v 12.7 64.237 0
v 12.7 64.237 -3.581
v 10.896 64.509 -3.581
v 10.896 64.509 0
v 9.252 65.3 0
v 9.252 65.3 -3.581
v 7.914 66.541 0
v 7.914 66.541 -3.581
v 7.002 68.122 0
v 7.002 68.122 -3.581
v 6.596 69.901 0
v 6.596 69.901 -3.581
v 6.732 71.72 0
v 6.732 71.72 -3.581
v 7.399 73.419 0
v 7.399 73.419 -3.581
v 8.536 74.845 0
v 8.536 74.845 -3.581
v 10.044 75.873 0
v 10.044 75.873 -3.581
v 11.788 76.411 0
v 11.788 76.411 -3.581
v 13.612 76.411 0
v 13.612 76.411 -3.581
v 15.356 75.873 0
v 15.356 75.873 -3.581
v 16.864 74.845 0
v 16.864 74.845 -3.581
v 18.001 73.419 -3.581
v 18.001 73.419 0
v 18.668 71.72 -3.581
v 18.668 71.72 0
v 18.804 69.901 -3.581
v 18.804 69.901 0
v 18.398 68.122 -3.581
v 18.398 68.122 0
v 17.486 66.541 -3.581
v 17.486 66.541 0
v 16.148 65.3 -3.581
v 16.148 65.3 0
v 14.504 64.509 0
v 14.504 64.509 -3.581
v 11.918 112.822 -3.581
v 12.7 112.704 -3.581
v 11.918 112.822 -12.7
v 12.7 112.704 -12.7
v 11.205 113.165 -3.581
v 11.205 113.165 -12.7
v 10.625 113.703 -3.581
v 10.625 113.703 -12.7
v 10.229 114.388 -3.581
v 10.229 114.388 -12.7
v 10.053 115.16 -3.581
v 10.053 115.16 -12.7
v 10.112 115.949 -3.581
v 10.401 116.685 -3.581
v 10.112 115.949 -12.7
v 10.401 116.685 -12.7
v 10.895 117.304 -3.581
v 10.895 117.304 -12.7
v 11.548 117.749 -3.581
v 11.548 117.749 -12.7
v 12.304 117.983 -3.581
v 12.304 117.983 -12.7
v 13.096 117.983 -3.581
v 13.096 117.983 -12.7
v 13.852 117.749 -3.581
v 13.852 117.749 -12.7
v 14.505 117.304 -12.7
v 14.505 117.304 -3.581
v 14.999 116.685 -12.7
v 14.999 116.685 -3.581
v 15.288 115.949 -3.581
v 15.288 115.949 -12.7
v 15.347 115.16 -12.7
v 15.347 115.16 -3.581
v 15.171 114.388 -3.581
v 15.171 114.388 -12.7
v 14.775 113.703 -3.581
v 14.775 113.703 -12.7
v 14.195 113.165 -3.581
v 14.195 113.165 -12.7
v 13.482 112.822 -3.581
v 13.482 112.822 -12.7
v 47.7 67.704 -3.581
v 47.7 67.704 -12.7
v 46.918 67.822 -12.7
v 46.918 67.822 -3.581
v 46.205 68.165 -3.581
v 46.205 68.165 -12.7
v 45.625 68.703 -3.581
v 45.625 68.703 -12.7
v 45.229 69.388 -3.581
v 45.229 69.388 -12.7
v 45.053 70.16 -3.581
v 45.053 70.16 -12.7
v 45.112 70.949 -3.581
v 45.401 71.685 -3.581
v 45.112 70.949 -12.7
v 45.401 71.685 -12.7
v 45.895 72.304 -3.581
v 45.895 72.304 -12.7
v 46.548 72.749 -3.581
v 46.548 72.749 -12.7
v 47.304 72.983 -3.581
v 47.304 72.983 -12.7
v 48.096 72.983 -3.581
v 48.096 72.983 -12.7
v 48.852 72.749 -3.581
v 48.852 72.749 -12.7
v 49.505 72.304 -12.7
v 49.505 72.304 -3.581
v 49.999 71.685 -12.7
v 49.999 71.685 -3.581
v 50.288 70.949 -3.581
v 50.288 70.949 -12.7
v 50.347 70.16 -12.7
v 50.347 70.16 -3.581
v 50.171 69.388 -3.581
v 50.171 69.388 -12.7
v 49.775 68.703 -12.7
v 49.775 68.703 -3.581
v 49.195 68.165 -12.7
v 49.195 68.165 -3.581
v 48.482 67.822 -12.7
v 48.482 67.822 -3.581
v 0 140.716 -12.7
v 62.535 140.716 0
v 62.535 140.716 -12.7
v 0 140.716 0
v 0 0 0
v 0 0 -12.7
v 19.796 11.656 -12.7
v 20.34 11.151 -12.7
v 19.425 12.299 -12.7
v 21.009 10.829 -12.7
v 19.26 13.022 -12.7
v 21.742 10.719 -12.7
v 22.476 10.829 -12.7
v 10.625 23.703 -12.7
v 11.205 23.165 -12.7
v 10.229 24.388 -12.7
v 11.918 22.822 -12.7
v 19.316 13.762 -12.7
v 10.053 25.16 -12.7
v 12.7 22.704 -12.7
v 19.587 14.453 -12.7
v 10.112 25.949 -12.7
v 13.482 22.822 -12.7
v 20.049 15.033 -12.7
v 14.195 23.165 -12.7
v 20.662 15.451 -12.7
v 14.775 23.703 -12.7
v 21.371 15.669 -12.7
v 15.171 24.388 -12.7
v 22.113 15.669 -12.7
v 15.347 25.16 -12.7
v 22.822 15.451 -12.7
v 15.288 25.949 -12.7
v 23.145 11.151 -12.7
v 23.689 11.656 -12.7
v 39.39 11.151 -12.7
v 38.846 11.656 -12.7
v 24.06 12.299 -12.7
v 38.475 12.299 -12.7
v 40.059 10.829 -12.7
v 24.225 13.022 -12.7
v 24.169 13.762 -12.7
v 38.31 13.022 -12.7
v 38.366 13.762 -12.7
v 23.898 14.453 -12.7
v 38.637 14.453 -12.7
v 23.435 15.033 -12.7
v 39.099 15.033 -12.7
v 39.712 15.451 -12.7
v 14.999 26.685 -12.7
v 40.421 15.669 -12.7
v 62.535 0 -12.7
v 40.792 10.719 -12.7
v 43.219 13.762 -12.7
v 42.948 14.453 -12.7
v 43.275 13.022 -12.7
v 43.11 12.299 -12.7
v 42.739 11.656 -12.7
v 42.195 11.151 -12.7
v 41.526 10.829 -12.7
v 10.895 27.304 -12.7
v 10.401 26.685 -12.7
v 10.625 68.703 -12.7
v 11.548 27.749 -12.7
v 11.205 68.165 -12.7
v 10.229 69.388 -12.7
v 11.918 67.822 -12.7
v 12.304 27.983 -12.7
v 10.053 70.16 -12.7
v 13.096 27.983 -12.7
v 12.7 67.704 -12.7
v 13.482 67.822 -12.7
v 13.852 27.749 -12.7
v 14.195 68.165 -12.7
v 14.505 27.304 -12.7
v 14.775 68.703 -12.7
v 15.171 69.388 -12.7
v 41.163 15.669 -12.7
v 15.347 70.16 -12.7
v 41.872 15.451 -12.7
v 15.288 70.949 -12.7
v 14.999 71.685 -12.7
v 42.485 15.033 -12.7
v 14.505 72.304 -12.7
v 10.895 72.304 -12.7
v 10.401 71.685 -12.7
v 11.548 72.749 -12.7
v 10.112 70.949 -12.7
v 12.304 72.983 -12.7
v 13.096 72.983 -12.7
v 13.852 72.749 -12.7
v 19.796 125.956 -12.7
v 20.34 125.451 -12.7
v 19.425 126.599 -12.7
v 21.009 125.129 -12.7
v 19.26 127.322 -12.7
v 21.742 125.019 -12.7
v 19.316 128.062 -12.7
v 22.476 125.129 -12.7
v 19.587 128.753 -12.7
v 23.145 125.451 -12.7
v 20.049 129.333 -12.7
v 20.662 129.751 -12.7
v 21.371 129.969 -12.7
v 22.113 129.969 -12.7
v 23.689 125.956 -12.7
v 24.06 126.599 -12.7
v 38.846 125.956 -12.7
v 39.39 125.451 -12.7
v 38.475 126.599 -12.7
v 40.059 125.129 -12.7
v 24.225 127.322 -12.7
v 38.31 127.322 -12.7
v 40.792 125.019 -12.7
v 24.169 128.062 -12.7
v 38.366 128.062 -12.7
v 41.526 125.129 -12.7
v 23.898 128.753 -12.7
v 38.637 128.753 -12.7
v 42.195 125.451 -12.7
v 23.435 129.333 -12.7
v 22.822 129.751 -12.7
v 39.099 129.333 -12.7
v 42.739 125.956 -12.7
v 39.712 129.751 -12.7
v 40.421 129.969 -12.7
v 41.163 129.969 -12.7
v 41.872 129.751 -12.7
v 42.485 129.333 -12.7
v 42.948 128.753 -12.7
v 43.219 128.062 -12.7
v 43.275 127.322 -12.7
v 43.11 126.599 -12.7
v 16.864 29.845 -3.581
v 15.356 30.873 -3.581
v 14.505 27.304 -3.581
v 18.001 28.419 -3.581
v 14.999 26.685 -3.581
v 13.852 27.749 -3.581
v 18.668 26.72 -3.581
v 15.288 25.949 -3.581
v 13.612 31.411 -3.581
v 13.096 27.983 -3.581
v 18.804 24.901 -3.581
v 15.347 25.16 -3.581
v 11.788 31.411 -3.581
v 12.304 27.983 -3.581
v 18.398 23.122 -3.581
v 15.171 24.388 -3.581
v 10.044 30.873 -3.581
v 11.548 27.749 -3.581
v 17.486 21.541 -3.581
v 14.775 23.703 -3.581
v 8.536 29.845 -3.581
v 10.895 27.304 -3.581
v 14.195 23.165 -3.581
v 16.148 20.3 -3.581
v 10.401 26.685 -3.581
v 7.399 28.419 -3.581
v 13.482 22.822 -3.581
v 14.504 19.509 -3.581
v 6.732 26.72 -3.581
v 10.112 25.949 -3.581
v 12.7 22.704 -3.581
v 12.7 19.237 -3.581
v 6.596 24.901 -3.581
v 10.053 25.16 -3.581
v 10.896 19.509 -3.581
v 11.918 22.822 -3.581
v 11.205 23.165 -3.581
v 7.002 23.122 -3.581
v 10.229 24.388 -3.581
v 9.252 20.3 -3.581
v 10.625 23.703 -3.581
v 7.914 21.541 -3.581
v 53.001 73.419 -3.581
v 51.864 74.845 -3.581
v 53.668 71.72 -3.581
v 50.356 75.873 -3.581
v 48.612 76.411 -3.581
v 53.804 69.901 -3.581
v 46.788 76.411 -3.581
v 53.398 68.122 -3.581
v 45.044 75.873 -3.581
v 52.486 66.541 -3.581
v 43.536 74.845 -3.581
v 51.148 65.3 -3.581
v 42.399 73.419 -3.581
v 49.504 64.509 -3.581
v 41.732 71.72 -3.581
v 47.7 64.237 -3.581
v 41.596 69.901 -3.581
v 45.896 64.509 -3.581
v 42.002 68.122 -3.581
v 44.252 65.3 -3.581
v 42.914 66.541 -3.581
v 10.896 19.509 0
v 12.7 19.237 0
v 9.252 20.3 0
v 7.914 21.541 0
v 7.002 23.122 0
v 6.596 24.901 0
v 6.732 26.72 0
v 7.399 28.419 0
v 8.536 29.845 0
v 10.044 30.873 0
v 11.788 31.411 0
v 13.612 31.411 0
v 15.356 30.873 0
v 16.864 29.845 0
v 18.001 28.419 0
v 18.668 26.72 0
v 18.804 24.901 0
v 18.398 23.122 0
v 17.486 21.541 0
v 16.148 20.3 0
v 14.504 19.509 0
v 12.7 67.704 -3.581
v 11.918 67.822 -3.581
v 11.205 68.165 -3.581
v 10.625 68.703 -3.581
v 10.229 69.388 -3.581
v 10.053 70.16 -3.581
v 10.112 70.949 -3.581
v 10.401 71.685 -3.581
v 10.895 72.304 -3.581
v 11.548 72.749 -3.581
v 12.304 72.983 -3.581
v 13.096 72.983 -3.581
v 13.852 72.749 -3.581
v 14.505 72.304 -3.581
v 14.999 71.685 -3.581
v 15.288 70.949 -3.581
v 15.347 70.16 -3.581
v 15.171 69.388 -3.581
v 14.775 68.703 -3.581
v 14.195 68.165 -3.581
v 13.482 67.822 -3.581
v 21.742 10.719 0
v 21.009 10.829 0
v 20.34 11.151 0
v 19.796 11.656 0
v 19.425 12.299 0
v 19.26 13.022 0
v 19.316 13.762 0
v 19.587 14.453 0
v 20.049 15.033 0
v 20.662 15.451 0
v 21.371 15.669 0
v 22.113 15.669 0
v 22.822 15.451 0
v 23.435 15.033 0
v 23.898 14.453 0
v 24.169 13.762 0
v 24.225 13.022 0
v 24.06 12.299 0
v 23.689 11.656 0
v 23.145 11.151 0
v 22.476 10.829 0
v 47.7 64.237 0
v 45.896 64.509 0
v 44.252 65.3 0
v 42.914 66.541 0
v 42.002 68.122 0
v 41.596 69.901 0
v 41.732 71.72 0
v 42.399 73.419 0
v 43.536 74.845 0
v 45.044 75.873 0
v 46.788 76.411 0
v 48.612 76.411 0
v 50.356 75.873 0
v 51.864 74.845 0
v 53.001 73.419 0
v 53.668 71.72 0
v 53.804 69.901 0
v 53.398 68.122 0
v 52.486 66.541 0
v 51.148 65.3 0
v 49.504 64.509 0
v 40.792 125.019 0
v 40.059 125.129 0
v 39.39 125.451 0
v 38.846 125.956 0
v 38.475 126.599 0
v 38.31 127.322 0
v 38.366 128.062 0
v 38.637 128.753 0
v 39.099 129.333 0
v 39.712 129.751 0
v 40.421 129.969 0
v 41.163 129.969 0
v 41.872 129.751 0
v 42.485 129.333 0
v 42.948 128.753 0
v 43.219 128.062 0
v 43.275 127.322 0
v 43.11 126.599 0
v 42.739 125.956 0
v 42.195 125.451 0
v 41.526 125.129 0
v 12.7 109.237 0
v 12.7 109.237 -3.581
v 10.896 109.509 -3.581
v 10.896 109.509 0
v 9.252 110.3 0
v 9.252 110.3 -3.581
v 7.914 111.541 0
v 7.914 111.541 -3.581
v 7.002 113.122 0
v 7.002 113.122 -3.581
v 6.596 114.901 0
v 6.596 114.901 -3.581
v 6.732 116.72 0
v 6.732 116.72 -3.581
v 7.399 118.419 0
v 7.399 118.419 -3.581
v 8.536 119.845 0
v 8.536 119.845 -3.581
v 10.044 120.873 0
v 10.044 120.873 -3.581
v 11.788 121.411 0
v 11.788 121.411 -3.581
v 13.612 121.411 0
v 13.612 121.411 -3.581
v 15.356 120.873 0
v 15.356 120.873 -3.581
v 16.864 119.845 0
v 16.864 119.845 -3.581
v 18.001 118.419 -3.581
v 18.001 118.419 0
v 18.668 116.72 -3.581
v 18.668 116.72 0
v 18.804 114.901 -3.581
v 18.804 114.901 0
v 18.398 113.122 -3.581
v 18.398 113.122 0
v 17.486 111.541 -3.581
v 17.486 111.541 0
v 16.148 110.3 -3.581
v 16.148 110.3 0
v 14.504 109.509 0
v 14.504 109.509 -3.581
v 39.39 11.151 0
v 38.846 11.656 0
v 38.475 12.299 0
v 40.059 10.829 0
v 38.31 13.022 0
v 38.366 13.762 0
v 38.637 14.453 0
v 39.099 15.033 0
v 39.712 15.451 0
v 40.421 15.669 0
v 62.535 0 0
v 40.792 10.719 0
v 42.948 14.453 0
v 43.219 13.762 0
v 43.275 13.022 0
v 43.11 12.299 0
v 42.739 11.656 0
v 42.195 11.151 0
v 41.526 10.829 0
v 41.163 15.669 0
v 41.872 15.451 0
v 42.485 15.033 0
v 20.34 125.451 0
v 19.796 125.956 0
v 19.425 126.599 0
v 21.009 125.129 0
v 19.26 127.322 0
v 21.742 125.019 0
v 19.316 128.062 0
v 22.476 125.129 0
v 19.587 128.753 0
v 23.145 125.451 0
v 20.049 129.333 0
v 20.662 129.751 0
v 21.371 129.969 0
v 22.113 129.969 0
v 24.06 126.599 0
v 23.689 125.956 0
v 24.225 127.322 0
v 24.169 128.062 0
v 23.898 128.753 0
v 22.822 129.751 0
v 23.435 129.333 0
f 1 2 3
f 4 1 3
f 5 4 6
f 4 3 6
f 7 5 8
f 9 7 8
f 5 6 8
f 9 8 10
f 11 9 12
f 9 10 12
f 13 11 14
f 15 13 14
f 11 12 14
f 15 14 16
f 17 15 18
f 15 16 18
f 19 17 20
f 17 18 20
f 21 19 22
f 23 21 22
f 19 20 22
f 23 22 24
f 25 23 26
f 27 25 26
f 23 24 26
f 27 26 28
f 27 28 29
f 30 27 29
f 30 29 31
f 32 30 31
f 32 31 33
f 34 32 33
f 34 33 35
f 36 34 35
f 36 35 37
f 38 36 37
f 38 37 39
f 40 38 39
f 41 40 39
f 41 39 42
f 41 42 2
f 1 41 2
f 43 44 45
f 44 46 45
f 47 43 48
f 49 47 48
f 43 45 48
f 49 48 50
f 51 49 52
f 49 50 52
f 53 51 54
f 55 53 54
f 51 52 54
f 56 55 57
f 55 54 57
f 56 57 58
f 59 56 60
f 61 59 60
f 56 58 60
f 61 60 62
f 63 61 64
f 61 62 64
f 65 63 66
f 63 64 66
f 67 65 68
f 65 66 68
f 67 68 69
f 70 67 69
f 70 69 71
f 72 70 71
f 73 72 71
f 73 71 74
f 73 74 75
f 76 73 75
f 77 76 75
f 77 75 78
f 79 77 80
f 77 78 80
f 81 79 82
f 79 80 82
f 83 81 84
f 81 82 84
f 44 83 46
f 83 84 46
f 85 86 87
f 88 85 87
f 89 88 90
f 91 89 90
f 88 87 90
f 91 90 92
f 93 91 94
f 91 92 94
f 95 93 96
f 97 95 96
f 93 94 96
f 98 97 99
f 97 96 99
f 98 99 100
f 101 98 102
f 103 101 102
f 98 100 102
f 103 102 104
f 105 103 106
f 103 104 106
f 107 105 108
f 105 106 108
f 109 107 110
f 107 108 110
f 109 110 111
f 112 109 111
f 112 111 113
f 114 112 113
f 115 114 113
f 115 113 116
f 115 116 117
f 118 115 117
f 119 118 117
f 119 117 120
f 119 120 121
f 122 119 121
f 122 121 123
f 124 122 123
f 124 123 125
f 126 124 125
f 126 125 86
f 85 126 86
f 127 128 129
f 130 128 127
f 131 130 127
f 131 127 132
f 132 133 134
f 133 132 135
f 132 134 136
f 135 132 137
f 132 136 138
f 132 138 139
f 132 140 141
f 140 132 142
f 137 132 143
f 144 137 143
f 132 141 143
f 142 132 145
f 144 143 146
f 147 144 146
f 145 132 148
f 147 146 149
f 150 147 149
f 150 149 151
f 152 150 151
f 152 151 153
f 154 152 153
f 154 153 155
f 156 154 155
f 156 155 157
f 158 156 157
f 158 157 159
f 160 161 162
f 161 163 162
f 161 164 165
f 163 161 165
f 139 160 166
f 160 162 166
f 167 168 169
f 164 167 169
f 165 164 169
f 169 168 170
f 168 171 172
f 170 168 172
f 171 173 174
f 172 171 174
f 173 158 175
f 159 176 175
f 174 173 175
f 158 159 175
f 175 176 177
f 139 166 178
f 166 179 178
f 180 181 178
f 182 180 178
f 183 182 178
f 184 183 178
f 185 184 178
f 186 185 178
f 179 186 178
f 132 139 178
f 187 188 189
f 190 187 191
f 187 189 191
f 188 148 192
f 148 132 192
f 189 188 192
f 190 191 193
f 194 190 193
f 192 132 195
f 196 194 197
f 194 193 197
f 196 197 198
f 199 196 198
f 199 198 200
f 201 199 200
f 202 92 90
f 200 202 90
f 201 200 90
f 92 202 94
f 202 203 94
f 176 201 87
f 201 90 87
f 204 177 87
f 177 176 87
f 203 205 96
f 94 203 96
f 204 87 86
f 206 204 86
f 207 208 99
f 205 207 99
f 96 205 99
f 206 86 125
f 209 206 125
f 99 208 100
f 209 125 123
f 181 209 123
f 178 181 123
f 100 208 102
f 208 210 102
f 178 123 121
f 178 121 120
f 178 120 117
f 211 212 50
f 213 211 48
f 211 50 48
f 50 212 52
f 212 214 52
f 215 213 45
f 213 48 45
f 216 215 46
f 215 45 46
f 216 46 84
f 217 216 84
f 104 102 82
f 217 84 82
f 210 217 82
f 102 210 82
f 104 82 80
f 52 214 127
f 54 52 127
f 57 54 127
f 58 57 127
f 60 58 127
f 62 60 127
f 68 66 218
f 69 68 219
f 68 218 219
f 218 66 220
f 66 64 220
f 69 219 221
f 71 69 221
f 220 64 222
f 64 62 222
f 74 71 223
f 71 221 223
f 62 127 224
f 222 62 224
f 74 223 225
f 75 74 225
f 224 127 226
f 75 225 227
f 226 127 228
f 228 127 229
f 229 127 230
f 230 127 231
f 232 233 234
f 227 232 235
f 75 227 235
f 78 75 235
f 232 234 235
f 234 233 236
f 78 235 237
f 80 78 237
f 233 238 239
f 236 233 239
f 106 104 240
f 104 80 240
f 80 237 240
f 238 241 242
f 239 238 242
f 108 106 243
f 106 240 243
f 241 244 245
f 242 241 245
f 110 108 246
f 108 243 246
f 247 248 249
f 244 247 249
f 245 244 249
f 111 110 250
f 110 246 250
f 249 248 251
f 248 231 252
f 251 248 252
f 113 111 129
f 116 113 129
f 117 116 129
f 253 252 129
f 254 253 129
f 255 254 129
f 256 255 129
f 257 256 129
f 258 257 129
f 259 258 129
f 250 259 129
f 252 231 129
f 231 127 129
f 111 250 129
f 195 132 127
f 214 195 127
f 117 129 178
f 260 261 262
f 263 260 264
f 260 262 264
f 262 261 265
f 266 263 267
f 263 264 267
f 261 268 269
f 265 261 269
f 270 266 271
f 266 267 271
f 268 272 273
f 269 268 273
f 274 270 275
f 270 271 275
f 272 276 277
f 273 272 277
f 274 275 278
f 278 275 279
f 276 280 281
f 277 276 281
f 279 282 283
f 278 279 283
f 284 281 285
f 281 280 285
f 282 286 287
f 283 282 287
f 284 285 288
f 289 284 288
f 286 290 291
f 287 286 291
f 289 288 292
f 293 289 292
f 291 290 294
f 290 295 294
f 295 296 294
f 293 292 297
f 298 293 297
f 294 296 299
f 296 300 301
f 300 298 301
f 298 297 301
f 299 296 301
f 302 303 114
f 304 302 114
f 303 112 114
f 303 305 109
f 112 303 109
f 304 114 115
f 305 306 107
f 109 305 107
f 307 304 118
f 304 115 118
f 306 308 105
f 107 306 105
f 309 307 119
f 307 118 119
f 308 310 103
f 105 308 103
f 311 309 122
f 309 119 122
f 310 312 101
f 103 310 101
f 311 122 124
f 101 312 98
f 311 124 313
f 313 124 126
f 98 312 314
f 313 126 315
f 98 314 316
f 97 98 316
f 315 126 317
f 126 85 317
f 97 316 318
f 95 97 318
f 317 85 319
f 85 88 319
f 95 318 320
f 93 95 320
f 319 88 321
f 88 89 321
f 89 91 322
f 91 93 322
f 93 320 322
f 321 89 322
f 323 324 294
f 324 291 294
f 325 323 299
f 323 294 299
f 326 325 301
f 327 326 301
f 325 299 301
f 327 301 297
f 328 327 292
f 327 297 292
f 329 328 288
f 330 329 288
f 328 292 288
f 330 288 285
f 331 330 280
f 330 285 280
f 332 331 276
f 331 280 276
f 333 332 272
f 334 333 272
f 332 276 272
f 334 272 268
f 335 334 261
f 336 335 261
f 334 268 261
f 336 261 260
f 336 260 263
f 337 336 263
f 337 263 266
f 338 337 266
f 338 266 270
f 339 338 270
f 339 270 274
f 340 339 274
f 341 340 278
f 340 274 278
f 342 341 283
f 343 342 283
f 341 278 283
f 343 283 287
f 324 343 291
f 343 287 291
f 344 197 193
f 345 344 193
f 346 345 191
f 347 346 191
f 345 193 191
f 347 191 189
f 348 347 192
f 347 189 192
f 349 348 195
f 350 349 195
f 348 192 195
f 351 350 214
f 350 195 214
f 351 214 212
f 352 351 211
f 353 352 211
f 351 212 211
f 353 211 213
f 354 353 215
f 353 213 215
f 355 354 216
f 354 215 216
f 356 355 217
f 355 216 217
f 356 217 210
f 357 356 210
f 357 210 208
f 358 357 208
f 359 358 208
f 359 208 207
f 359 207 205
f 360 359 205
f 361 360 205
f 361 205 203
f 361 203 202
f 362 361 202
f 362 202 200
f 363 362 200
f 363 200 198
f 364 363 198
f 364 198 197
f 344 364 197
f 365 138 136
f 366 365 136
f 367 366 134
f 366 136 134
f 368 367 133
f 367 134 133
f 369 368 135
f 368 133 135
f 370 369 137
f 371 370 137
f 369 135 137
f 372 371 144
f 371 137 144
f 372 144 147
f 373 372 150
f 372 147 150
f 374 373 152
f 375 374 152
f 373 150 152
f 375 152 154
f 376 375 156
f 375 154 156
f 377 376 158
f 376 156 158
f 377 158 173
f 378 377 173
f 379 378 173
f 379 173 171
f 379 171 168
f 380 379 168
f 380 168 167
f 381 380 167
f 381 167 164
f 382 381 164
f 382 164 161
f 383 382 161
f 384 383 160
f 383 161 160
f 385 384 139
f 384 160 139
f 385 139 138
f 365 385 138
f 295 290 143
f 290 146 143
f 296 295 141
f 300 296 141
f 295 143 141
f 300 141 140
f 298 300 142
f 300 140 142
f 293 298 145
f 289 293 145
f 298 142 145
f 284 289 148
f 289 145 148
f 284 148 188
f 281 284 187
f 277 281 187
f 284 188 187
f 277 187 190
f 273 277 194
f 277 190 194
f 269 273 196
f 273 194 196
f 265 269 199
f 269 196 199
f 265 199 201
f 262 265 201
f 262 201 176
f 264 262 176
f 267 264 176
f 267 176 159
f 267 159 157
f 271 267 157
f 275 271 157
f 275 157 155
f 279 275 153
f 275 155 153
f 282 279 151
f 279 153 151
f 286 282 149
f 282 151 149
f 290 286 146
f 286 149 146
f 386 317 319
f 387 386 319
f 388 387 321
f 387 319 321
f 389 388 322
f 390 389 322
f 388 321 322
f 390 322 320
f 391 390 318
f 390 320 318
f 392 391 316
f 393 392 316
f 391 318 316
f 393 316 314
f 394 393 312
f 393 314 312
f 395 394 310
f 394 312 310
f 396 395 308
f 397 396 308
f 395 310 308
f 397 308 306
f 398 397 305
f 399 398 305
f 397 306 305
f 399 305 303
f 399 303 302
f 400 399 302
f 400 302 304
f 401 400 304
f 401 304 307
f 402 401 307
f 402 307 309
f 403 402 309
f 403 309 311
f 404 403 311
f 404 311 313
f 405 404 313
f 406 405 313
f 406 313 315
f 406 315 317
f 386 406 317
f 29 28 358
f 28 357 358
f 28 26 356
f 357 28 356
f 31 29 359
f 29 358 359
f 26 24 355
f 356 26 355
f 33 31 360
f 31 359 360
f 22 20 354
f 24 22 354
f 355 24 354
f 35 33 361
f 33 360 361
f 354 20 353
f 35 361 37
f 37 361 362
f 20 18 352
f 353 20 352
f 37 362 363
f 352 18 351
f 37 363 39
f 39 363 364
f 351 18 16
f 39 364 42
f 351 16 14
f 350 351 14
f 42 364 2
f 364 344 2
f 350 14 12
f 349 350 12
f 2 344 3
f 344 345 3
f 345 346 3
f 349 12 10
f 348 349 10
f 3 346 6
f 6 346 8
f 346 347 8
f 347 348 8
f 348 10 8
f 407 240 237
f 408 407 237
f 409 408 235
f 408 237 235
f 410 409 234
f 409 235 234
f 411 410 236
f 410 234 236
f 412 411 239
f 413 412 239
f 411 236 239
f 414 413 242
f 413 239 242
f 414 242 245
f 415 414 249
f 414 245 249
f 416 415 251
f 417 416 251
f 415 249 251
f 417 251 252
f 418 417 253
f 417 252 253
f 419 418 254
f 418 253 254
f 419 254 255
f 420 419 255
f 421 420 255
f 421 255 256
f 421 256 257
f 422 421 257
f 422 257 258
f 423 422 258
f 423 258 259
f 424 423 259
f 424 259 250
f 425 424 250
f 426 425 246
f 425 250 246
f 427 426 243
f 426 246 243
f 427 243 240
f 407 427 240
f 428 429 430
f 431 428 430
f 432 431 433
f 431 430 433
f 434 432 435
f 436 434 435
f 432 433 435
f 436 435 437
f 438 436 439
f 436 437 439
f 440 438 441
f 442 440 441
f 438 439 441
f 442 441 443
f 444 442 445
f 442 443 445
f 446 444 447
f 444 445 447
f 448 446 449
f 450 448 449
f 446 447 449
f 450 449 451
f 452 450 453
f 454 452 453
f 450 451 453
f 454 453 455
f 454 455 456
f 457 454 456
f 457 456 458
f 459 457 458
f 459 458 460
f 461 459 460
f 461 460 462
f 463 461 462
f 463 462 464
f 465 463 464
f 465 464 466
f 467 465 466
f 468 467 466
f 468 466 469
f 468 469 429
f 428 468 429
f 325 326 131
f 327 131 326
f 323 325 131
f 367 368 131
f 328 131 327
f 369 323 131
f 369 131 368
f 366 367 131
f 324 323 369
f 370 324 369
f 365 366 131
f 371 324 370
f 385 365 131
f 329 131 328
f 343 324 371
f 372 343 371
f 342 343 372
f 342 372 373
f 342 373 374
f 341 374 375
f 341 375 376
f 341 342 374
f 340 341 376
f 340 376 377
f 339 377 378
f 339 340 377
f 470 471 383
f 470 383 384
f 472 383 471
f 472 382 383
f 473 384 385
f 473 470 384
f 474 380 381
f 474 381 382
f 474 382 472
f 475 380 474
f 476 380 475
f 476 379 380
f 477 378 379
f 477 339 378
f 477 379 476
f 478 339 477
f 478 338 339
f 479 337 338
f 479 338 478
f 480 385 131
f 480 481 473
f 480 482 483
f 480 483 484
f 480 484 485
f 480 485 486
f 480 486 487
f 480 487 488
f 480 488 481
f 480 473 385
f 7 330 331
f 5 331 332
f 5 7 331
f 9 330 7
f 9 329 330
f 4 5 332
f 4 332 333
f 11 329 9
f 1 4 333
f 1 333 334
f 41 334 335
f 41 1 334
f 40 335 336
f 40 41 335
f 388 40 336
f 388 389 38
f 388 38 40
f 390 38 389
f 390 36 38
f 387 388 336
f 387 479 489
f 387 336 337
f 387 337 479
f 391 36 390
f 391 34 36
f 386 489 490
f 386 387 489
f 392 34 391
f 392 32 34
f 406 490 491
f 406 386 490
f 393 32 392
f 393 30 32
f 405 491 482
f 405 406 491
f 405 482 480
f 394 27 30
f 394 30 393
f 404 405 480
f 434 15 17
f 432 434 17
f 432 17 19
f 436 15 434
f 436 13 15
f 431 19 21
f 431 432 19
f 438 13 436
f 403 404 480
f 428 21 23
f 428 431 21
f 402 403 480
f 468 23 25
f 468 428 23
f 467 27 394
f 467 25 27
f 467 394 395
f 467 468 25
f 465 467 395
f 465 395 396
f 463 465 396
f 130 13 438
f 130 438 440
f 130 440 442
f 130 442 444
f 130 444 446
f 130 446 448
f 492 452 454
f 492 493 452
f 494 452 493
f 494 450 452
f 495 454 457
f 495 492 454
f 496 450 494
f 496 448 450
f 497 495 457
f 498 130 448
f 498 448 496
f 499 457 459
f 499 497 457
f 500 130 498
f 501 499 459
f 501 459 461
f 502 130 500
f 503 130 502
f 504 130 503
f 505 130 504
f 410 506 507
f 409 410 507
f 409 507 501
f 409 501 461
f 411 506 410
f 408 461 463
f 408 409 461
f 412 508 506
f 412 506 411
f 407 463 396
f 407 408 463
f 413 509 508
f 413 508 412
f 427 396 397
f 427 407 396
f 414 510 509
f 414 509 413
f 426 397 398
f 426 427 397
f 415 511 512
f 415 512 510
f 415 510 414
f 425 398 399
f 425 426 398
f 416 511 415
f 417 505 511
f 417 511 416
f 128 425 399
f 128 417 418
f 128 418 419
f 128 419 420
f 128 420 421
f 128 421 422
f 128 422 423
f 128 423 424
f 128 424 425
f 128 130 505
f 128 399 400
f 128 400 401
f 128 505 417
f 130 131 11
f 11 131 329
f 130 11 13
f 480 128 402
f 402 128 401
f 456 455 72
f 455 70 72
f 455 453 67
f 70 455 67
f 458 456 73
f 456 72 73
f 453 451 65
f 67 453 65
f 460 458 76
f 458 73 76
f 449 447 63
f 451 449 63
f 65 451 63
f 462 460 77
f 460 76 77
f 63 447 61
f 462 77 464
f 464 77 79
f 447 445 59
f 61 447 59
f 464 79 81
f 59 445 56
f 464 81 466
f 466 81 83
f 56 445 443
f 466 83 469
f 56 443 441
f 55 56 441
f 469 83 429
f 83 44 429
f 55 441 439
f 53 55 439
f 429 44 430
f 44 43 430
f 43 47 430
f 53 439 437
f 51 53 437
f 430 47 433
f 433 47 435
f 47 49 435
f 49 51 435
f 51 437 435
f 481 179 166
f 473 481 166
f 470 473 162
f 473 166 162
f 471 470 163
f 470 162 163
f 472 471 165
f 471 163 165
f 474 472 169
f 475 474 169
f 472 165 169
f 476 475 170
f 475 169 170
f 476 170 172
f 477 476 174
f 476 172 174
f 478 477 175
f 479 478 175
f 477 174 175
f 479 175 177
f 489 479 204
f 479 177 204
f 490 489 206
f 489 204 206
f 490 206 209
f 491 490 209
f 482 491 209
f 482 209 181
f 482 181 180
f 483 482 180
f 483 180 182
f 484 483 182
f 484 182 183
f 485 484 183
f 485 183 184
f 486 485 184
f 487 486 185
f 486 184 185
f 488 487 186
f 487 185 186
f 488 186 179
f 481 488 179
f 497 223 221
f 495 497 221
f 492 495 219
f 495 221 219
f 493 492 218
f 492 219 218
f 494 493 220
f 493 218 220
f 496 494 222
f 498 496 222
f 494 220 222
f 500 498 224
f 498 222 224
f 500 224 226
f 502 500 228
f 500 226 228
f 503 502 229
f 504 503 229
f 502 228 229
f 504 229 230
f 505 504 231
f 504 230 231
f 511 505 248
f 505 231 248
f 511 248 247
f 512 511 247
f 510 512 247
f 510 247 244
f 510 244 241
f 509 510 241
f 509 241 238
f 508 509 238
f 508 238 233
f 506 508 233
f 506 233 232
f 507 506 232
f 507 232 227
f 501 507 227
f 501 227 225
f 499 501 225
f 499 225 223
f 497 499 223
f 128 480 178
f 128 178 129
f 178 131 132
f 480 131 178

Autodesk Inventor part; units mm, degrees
ref_plane "YZ Plane" through (0, 0, 0) normal (1, 0, 0) x (0, 1, 0)
ref_plane "XZ Plane" through (0, 0, 0) normal (0, 1, 0) x (-1, 0, 0)
ref_plane "XY Plane" through (0, 0, 0) normal (0, 0, 1) x (1, 0, 0)
sketch "Sketch1" plane through (0, 0, 0) normal (0, 0, 1) x (1, 0, 0)
  line L0 (0, 0) -> (62.5348, 0)
  line L1 (62.5348, 0) -> (62.5348, 140.716)
  line L2 (62.5348, 140.716) -> (0, 140.716)
  line L3 (0, 140.716) -> (0, 0)
  line L4 (0, 70.358) -> (62.5348, 70.358)
  circle A0 centre (12.7, 70.358) radius 2.5
  circle A1 centre (12.7, 115.358) radius 2.5
  circle A2 centre (12.7, 25.358) radius 2.5
  circle A3 centre (21.7424, 127.508) radius 3.175
  circle A4 centre (21.7424, 13.208) radius 3.175
  circle A5 centre (40.7924, 127.508) radius 3.175
  circle A6 centre (40.7924, 13.208) radius 3.175
  circle A7 centre (47.7, 70.358) radius 2.5
  dimension "d0" = 140.716
  dimension "d1" = 5
  dimension "d2" = 12.7
  dimension "d3" = 45
  dimension "d5" = 6.35
  dimension "d6" = 114.3
  dimension "d10" = 19.05
  dimension "d16" = 35
  dimension "d33" = 62.5348
  dimension "d34" = 21.7424
  dimension "d35" = 21.7424
extrude "Extrusion1" add sketch "Sketch1" against normal blind 12.7 contours L3 L4 A0 A7 L1 L0 | L3 L2 L1 L4 A7 A0 | A0 L4 | L4 A0 | A7 L4 | L4 A7 | A1 | A2 | A3 | A4 | A5 | A6
hole "Hole1" at (12.7, 115.358, 0) at (12.7, 70.358, 0) at (12.7, 25.358, 0) at (47.7, 70.358, 0) direction (0, 0, -1) diameter 5.3086 end through all counterbore diameter 12.2428 counterbore depth 3.5814 clearance for "Hex Head Bolt" size "M5" standard "Ansi Metric M Profile"
hole "Hole2" at (21.7424, 13.208, 0) at (40.7924, 13.208, 0) at (40.7924, 127.508, 0) at (21.7424, 127.508, 0) direction (0, 0, -1) diameter 4.9784 end through all thread size "1/4-20 UNC" class "2B" standard "ANSI Unified Screw Threads"
equation "\"d34\" = d35"
properties part number "Fixed Side Adapter Plate"
